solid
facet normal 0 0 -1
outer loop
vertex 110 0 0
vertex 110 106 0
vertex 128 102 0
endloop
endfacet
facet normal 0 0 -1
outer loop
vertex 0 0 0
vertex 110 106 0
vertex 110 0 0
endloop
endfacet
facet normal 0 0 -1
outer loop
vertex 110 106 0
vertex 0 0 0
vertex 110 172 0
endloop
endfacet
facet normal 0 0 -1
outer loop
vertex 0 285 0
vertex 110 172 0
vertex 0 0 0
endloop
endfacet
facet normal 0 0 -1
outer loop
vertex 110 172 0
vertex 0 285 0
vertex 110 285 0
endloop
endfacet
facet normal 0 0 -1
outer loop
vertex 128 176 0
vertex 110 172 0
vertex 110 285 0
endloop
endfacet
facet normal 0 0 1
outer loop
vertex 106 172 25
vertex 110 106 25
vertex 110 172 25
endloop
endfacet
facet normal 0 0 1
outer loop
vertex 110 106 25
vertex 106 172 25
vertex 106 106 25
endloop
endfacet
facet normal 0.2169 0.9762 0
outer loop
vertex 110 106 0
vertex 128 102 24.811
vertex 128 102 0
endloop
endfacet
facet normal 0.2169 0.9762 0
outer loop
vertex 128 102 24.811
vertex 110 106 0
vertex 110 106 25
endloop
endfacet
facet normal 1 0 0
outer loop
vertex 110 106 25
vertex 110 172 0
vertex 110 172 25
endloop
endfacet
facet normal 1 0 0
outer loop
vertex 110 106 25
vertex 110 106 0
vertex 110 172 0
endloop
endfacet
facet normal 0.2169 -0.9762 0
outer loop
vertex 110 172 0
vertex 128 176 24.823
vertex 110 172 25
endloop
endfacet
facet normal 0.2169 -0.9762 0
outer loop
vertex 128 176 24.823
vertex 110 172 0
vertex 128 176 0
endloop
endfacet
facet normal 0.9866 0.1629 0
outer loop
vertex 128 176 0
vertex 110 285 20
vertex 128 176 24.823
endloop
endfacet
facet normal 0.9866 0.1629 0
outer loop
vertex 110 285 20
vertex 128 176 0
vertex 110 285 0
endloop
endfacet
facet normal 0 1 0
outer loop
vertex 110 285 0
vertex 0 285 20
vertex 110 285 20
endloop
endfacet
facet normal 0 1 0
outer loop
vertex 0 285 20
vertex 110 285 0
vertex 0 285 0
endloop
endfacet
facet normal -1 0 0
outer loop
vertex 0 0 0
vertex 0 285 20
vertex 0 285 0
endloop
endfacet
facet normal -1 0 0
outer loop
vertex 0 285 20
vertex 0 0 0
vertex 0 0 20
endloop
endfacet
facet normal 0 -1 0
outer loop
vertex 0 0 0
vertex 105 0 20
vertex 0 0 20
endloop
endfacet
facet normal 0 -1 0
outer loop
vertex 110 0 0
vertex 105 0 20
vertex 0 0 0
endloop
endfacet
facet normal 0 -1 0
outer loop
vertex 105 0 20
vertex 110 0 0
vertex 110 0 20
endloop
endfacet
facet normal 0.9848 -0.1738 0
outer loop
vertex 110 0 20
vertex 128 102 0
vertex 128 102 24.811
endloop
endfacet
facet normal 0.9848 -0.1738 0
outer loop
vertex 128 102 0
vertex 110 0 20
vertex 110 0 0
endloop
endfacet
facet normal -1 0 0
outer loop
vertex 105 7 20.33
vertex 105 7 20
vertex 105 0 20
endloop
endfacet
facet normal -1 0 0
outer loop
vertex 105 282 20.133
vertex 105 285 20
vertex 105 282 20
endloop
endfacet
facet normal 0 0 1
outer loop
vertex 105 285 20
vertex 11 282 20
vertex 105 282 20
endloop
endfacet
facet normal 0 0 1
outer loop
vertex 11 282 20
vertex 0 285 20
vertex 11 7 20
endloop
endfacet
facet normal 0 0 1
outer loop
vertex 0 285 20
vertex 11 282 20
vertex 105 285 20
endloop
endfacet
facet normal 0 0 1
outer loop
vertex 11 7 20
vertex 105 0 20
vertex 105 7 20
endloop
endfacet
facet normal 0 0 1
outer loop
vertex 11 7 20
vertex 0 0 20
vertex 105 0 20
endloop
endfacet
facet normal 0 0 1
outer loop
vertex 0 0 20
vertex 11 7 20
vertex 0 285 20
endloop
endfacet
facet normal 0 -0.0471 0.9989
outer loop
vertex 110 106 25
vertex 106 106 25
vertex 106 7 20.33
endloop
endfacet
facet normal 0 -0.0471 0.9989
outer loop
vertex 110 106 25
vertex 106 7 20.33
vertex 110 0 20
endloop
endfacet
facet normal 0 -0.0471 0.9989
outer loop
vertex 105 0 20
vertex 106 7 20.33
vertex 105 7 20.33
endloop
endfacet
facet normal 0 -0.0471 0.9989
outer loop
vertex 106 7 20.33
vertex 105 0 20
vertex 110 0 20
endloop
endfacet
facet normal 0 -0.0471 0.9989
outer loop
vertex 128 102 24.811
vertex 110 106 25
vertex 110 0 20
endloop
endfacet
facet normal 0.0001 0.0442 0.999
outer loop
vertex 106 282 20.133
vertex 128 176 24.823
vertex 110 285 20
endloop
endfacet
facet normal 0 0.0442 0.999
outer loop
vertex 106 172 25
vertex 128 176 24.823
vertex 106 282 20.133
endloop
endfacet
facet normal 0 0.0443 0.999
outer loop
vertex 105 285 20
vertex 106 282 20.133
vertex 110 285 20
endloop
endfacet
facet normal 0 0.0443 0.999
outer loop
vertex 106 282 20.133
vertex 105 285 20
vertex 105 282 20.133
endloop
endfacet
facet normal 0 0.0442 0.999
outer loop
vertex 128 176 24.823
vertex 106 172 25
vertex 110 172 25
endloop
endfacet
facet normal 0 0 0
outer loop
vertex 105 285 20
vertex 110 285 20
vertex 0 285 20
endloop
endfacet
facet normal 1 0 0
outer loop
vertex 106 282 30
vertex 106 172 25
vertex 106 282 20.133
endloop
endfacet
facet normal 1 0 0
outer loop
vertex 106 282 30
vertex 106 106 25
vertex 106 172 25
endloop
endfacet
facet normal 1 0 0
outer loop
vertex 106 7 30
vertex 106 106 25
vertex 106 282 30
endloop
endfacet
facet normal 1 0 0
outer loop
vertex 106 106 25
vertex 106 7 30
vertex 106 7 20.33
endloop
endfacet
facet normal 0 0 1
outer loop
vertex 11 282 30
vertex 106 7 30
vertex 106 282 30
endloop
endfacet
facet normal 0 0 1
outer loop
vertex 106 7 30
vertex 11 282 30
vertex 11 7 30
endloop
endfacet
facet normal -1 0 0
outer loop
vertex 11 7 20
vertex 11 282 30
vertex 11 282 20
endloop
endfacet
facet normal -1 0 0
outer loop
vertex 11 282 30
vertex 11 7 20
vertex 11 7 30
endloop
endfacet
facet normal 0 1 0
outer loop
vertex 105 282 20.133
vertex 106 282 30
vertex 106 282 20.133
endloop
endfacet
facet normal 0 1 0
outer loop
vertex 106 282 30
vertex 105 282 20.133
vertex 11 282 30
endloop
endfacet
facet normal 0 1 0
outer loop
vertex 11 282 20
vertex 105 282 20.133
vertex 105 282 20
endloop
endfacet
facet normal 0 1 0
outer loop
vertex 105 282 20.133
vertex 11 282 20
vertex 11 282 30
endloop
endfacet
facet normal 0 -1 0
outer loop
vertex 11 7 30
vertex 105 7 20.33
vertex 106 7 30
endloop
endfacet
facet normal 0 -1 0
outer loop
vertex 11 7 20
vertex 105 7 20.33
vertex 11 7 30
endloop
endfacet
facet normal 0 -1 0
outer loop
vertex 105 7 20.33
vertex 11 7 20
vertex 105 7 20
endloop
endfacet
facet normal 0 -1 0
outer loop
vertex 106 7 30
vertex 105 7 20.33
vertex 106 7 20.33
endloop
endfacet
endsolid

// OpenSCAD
module UhkRough() {
    // add the case
    basePoints = [
        [0, 0], // 0
        [110, 0], // 1
        [128, 102], // 2
        [110, 106], // 3
        [110, 172], // 4
        [128, 176], // 5
        [110, 285], // 6
        [0, 285] // 7
    ];


    union() {
      difference(){
        color("#69BE28") linear_extrude(25)
          polygon(basePoints);
        translate([-10, -10, 20]) cube([115, 295, 30]);
        translate([0, 0, 20]) rotate([atan(5/106), 0, 0]) cube([200, 200, 30]);
        translate([0, 172, 25]) rotate([-atan(5/(285-172)), 0, 0]) cube([200, 200, 30]);
      }
      // then add the keys
      translate([11, 7, 20])
        cube([95, 275, 10]);
    }
}

UhkRough();
